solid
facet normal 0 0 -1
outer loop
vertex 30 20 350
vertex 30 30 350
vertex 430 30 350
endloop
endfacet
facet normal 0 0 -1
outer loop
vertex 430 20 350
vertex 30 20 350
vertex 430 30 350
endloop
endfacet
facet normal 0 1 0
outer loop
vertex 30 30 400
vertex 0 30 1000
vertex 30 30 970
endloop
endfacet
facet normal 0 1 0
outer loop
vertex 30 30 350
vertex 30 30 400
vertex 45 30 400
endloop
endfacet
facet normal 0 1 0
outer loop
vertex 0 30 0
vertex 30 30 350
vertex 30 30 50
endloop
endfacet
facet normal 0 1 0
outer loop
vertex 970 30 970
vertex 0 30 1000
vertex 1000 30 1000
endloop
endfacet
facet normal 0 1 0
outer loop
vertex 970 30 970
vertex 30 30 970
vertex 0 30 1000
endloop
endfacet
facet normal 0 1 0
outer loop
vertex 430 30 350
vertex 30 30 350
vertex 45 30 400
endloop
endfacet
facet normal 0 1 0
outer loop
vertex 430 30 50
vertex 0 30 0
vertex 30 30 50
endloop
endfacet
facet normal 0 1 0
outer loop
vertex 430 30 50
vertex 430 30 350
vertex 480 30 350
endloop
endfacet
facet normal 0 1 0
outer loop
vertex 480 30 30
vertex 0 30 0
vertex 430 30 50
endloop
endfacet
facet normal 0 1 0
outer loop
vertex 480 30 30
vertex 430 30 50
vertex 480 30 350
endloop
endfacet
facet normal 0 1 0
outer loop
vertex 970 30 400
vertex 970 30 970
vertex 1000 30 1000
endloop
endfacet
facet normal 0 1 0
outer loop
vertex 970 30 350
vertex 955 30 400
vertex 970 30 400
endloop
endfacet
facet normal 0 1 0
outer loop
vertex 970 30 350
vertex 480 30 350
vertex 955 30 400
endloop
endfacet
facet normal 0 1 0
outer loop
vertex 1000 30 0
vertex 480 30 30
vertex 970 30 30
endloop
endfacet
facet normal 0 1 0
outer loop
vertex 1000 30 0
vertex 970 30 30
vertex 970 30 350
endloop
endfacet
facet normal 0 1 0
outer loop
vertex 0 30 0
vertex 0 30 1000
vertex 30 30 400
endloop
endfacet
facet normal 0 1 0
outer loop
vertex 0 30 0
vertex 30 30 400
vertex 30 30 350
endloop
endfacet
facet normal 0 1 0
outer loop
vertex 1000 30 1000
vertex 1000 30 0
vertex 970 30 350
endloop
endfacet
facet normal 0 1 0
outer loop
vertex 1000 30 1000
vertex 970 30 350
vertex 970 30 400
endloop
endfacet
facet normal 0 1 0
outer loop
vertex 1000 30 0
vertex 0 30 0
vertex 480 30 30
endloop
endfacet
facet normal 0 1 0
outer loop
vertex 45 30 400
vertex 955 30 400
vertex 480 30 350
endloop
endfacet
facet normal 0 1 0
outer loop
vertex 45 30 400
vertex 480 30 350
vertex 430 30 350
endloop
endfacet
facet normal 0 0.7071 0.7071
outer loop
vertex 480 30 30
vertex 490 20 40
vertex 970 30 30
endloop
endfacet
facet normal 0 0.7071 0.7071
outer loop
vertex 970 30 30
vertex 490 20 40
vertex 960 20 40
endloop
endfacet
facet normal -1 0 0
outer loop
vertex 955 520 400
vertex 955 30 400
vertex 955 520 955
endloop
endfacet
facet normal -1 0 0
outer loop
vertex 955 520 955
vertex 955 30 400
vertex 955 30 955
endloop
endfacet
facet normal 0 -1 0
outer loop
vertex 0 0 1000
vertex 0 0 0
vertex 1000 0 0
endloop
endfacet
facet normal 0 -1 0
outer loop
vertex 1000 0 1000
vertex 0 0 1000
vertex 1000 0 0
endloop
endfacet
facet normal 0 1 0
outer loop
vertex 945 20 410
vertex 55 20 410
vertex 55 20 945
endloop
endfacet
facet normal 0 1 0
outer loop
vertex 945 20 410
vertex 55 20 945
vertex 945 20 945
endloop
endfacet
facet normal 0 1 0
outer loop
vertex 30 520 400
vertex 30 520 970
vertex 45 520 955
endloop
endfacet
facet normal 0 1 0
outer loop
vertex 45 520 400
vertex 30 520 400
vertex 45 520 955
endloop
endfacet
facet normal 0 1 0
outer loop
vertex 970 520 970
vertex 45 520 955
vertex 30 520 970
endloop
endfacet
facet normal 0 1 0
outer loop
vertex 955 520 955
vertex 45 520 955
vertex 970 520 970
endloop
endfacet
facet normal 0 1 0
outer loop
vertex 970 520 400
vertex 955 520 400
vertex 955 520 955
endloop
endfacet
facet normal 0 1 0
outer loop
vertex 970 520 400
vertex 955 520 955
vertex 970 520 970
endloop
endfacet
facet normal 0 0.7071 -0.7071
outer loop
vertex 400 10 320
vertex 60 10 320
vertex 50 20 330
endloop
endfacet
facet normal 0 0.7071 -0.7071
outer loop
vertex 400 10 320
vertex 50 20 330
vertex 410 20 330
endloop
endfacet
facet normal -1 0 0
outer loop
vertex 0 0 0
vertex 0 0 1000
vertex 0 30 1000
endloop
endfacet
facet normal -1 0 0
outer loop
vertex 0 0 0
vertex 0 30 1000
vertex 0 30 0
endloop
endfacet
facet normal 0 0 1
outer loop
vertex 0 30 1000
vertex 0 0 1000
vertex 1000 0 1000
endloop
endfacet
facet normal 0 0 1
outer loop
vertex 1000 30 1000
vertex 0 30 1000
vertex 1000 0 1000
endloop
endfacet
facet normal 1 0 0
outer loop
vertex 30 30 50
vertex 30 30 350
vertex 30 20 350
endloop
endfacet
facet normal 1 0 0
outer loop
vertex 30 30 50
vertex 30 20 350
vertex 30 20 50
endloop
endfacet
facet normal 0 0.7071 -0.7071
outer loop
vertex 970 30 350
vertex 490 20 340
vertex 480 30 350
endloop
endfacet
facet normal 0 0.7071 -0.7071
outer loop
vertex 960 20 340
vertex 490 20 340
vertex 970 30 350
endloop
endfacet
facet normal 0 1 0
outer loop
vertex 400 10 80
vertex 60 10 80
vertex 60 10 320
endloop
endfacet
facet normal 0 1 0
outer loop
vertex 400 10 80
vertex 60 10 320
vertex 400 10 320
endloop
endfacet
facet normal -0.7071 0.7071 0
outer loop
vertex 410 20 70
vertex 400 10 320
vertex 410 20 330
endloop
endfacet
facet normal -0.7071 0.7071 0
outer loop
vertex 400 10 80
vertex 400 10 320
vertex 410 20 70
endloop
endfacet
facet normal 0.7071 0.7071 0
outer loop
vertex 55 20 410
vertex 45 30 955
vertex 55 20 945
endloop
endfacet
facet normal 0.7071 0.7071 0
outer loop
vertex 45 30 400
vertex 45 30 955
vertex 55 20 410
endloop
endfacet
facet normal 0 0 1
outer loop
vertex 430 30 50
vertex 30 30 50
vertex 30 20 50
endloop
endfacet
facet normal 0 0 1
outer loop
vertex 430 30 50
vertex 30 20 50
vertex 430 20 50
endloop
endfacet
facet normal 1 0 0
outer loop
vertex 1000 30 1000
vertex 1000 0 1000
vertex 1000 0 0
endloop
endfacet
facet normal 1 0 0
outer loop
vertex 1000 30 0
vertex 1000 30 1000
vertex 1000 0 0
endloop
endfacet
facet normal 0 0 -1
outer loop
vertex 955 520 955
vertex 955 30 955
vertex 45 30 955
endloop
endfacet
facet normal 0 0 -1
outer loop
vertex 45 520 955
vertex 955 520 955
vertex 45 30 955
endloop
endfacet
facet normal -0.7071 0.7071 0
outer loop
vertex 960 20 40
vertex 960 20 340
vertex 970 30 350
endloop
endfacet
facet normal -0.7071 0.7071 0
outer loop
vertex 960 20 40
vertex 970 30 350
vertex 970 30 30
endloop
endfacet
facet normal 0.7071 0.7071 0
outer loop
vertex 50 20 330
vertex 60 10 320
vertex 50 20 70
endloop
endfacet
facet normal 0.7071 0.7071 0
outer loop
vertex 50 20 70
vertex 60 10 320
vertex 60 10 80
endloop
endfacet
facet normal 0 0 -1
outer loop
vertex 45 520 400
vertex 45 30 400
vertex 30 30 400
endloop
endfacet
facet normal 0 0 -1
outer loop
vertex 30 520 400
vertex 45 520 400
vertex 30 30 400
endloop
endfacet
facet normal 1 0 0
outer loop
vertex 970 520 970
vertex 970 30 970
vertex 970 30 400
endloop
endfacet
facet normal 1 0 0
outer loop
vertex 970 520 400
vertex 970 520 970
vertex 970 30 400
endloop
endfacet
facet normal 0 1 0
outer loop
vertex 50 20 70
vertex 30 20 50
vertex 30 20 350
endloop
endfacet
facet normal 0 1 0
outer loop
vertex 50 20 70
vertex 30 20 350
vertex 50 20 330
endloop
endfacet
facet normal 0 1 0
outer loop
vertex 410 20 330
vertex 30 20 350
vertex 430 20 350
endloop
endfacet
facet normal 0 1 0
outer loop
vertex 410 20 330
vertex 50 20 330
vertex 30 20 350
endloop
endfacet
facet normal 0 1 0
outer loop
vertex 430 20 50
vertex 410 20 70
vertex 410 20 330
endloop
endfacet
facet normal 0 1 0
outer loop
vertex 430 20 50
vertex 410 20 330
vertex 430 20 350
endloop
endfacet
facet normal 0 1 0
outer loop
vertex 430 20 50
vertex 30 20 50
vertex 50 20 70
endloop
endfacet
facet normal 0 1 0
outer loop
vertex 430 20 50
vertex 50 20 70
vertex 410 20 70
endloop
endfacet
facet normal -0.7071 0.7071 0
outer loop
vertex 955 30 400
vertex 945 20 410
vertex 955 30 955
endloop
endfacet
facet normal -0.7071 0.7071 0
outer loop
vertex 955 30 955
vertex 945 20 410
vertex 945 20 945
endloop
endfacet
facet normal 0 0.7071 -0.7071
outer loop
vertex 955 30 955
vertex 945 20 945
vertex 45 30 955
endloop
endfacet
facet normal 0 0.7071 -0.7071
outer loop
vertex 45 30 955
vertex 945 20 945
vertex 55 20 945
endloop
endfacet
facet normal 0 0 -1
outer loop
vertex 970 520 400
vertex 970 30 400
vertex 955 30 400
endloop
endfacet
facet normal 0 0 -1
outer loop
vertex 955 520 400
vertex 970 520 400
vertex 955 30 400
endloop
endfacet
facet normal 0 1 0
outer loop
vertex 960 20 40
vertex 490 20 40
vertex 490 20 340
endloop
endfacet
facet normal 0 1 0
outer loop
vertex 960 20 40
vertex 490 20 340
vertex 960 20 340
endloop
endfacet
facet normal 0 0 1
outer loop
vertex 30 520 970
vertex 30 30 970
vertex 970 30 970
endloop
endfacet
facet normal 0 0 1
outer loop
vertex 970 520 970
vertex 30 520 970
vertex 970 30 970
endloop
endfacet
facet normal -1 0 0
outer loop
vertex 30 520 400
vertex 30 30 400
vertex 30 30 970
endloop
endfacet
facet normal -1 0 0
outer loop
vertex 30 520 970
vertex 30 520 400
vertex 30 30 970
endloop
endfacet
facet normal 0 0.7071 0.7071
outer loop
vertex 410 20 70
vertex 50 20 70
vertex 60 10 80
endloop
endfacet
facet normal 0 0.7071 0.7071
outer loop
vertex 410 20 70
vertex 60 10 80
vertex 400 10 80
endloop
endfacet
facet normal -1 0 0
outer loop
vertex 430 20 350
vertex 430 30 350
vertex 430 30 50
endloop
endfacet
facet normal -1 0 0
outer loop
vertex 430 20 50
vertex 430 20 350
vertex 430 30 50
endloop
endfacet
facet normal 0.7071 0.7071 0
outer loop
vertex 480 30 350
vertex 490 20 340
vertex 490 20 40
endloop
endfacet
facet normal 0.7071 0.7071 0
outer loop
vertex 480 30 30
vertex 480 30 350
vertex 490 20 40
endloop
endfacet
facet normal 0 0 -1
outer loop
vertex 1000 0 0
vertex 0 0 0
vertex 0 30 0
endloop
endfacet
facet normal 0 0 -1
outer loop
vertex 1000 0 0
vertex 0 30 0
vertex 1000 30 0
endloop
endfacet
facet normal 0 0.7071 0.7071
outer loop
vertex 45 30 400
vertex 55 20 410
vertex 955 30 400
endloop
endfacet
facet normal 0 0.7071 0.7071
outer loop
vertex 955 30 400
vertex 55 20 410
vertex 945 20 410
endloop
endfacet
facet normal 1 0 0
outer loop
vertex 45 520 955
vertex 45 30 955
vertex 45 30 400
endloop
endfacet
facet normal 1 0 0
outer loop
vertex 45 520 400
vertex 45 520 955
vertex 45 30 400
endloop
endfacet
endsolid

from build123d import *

# Parameters (mm, degrees)
SKETCH1_W           = 1000
SKETCH1_H           = 1000
BOSS_EXTRUDE1_DEPTH = 30
SKETCH2_W           = 400
SKETCH2_H           = 300
CUT_EXTRUDE1_DEPTH  = 20
SKETCH3_W           = 400
SKETCH3_H           = 300
SKETCH3_W_2         = 360
SKETCH3_H_2         = 260
BOSS_EXTRUDE2_DEPTH = 10
CHAMFER1_SIZE       = 10
SKETCH5_W           = 490
SKETCH5_H           = 320
SKETCH5_W_2         = 940
SKETCH5_H_2         = 570
CUT_EXTRUDE2_DEPTH  = 10
BOSS_EXTRUDE5_DEPTH = 500
CHAMFER3_SIZE       = 10


with BuildPart() as part:
    # Sketch1 → Boss-Extrude1 (new body)
    with BuildSketch(Plane(origin=(0, 0, 0), x_dir=(1, 0, 0), z_dir=(0, 1, 0))):
        with Locations((500, -500)):
            Rectangle(SKETCH1_W, SKETCH1_H)
    extrude(amount=BOSS_EXTRUDE1_DEPTH)

    # Sketch2 → Cut-Extrude1 (cut)
    with BuildSketch(Plane(origin=(0, 30, 0), x_dir=(1, 0, 0), z_dir=(0, 1, 0))):
        with Locations((230, -200)):
            Rectangle(SKETCH2_W, SKETCH2_H)
    extrude(amount=-CUT_EXTRUDE1_DEPTH, mode=Mode.SUBTRACT)

    # Sketch3 → Boss-Extrude2 (add)
    with BuildSketch(Plane(origin=(0, 10, 0), x_dir=(1, 0, 0), z_dir=(0, 1, 0))):
        with Locations((230, -200)):
            Rectangle(SKETCH3_W, SKETCH3_H)
        with Locations((230, -200)):
            Rectangle(SKETCH3_W_2, SKETCH3_H_2, mode=Mode.SUBTRACT)
    extrude(amount=BOSS_EXTRUDE2_DEPTH)

    # Chamfer1
    chamfer1_edges = [part.edges().sort_by_distance(p)[0] for p in [
        (230, 10, 70),
        (410, 10, 200),
        (230, 10, 330),
        (50, 10, 200),
    ]]
    chamfer(chamfer1_edges, length=CHAMFER1_SIZE - 0.0001)  # a hair under: the kernel refuses the full size

    # Sketch5 → Cut-Extrude2 (cut)
    with BuildSketch(Plane(origin=(0, 30, 0), x_dir=(1, 0, 0), z_dir=(0, 1, 0))):
        with Locations((725, -190)):
            Rectangle(SKETCH5_W, SKETCH5_H)
        with Locations((500, -685)):
            Rectangle(SKETCH5_W_2, SKETCH5_H_2)
    extrude(amount=-CUT_EXTRUDE2_DEPTH, mode=Mode.SUBTRACT)

    # Sketch7 → Boss-Extrude5 (add)
    with BuildSketch(Plane(origin=(0, 20, 0), x_dir=(1, 0, 0), z_dir=(0, 1, 0))):
        Polygon((970, -400), (955, -400), (955, -955), (45, -955), (45, -400), (30, -400), (30, -970), (970, -970), align=None)
    extrude(amount=BOSS_EXTRUDE5_DEPTH)

    # Chamfer3
    chamfer3_edges = [part.edges().sort_by_distance(p)[0] for p in [
        (725, 20, 30),
        (970, 20, 190),
        (725, 20, 350),
        (480, 20, 190),
        (45, 20, 677.5),
        (500, 20, 400),
        (955, 20, 677.5),
        (500, 20, 955),
    ]]
    chamfer(chamfer3_edges, length=CHAMFER3_SIZE - 0.0001)  # a hair under: the kernel refuses the full size


solid = part.part
